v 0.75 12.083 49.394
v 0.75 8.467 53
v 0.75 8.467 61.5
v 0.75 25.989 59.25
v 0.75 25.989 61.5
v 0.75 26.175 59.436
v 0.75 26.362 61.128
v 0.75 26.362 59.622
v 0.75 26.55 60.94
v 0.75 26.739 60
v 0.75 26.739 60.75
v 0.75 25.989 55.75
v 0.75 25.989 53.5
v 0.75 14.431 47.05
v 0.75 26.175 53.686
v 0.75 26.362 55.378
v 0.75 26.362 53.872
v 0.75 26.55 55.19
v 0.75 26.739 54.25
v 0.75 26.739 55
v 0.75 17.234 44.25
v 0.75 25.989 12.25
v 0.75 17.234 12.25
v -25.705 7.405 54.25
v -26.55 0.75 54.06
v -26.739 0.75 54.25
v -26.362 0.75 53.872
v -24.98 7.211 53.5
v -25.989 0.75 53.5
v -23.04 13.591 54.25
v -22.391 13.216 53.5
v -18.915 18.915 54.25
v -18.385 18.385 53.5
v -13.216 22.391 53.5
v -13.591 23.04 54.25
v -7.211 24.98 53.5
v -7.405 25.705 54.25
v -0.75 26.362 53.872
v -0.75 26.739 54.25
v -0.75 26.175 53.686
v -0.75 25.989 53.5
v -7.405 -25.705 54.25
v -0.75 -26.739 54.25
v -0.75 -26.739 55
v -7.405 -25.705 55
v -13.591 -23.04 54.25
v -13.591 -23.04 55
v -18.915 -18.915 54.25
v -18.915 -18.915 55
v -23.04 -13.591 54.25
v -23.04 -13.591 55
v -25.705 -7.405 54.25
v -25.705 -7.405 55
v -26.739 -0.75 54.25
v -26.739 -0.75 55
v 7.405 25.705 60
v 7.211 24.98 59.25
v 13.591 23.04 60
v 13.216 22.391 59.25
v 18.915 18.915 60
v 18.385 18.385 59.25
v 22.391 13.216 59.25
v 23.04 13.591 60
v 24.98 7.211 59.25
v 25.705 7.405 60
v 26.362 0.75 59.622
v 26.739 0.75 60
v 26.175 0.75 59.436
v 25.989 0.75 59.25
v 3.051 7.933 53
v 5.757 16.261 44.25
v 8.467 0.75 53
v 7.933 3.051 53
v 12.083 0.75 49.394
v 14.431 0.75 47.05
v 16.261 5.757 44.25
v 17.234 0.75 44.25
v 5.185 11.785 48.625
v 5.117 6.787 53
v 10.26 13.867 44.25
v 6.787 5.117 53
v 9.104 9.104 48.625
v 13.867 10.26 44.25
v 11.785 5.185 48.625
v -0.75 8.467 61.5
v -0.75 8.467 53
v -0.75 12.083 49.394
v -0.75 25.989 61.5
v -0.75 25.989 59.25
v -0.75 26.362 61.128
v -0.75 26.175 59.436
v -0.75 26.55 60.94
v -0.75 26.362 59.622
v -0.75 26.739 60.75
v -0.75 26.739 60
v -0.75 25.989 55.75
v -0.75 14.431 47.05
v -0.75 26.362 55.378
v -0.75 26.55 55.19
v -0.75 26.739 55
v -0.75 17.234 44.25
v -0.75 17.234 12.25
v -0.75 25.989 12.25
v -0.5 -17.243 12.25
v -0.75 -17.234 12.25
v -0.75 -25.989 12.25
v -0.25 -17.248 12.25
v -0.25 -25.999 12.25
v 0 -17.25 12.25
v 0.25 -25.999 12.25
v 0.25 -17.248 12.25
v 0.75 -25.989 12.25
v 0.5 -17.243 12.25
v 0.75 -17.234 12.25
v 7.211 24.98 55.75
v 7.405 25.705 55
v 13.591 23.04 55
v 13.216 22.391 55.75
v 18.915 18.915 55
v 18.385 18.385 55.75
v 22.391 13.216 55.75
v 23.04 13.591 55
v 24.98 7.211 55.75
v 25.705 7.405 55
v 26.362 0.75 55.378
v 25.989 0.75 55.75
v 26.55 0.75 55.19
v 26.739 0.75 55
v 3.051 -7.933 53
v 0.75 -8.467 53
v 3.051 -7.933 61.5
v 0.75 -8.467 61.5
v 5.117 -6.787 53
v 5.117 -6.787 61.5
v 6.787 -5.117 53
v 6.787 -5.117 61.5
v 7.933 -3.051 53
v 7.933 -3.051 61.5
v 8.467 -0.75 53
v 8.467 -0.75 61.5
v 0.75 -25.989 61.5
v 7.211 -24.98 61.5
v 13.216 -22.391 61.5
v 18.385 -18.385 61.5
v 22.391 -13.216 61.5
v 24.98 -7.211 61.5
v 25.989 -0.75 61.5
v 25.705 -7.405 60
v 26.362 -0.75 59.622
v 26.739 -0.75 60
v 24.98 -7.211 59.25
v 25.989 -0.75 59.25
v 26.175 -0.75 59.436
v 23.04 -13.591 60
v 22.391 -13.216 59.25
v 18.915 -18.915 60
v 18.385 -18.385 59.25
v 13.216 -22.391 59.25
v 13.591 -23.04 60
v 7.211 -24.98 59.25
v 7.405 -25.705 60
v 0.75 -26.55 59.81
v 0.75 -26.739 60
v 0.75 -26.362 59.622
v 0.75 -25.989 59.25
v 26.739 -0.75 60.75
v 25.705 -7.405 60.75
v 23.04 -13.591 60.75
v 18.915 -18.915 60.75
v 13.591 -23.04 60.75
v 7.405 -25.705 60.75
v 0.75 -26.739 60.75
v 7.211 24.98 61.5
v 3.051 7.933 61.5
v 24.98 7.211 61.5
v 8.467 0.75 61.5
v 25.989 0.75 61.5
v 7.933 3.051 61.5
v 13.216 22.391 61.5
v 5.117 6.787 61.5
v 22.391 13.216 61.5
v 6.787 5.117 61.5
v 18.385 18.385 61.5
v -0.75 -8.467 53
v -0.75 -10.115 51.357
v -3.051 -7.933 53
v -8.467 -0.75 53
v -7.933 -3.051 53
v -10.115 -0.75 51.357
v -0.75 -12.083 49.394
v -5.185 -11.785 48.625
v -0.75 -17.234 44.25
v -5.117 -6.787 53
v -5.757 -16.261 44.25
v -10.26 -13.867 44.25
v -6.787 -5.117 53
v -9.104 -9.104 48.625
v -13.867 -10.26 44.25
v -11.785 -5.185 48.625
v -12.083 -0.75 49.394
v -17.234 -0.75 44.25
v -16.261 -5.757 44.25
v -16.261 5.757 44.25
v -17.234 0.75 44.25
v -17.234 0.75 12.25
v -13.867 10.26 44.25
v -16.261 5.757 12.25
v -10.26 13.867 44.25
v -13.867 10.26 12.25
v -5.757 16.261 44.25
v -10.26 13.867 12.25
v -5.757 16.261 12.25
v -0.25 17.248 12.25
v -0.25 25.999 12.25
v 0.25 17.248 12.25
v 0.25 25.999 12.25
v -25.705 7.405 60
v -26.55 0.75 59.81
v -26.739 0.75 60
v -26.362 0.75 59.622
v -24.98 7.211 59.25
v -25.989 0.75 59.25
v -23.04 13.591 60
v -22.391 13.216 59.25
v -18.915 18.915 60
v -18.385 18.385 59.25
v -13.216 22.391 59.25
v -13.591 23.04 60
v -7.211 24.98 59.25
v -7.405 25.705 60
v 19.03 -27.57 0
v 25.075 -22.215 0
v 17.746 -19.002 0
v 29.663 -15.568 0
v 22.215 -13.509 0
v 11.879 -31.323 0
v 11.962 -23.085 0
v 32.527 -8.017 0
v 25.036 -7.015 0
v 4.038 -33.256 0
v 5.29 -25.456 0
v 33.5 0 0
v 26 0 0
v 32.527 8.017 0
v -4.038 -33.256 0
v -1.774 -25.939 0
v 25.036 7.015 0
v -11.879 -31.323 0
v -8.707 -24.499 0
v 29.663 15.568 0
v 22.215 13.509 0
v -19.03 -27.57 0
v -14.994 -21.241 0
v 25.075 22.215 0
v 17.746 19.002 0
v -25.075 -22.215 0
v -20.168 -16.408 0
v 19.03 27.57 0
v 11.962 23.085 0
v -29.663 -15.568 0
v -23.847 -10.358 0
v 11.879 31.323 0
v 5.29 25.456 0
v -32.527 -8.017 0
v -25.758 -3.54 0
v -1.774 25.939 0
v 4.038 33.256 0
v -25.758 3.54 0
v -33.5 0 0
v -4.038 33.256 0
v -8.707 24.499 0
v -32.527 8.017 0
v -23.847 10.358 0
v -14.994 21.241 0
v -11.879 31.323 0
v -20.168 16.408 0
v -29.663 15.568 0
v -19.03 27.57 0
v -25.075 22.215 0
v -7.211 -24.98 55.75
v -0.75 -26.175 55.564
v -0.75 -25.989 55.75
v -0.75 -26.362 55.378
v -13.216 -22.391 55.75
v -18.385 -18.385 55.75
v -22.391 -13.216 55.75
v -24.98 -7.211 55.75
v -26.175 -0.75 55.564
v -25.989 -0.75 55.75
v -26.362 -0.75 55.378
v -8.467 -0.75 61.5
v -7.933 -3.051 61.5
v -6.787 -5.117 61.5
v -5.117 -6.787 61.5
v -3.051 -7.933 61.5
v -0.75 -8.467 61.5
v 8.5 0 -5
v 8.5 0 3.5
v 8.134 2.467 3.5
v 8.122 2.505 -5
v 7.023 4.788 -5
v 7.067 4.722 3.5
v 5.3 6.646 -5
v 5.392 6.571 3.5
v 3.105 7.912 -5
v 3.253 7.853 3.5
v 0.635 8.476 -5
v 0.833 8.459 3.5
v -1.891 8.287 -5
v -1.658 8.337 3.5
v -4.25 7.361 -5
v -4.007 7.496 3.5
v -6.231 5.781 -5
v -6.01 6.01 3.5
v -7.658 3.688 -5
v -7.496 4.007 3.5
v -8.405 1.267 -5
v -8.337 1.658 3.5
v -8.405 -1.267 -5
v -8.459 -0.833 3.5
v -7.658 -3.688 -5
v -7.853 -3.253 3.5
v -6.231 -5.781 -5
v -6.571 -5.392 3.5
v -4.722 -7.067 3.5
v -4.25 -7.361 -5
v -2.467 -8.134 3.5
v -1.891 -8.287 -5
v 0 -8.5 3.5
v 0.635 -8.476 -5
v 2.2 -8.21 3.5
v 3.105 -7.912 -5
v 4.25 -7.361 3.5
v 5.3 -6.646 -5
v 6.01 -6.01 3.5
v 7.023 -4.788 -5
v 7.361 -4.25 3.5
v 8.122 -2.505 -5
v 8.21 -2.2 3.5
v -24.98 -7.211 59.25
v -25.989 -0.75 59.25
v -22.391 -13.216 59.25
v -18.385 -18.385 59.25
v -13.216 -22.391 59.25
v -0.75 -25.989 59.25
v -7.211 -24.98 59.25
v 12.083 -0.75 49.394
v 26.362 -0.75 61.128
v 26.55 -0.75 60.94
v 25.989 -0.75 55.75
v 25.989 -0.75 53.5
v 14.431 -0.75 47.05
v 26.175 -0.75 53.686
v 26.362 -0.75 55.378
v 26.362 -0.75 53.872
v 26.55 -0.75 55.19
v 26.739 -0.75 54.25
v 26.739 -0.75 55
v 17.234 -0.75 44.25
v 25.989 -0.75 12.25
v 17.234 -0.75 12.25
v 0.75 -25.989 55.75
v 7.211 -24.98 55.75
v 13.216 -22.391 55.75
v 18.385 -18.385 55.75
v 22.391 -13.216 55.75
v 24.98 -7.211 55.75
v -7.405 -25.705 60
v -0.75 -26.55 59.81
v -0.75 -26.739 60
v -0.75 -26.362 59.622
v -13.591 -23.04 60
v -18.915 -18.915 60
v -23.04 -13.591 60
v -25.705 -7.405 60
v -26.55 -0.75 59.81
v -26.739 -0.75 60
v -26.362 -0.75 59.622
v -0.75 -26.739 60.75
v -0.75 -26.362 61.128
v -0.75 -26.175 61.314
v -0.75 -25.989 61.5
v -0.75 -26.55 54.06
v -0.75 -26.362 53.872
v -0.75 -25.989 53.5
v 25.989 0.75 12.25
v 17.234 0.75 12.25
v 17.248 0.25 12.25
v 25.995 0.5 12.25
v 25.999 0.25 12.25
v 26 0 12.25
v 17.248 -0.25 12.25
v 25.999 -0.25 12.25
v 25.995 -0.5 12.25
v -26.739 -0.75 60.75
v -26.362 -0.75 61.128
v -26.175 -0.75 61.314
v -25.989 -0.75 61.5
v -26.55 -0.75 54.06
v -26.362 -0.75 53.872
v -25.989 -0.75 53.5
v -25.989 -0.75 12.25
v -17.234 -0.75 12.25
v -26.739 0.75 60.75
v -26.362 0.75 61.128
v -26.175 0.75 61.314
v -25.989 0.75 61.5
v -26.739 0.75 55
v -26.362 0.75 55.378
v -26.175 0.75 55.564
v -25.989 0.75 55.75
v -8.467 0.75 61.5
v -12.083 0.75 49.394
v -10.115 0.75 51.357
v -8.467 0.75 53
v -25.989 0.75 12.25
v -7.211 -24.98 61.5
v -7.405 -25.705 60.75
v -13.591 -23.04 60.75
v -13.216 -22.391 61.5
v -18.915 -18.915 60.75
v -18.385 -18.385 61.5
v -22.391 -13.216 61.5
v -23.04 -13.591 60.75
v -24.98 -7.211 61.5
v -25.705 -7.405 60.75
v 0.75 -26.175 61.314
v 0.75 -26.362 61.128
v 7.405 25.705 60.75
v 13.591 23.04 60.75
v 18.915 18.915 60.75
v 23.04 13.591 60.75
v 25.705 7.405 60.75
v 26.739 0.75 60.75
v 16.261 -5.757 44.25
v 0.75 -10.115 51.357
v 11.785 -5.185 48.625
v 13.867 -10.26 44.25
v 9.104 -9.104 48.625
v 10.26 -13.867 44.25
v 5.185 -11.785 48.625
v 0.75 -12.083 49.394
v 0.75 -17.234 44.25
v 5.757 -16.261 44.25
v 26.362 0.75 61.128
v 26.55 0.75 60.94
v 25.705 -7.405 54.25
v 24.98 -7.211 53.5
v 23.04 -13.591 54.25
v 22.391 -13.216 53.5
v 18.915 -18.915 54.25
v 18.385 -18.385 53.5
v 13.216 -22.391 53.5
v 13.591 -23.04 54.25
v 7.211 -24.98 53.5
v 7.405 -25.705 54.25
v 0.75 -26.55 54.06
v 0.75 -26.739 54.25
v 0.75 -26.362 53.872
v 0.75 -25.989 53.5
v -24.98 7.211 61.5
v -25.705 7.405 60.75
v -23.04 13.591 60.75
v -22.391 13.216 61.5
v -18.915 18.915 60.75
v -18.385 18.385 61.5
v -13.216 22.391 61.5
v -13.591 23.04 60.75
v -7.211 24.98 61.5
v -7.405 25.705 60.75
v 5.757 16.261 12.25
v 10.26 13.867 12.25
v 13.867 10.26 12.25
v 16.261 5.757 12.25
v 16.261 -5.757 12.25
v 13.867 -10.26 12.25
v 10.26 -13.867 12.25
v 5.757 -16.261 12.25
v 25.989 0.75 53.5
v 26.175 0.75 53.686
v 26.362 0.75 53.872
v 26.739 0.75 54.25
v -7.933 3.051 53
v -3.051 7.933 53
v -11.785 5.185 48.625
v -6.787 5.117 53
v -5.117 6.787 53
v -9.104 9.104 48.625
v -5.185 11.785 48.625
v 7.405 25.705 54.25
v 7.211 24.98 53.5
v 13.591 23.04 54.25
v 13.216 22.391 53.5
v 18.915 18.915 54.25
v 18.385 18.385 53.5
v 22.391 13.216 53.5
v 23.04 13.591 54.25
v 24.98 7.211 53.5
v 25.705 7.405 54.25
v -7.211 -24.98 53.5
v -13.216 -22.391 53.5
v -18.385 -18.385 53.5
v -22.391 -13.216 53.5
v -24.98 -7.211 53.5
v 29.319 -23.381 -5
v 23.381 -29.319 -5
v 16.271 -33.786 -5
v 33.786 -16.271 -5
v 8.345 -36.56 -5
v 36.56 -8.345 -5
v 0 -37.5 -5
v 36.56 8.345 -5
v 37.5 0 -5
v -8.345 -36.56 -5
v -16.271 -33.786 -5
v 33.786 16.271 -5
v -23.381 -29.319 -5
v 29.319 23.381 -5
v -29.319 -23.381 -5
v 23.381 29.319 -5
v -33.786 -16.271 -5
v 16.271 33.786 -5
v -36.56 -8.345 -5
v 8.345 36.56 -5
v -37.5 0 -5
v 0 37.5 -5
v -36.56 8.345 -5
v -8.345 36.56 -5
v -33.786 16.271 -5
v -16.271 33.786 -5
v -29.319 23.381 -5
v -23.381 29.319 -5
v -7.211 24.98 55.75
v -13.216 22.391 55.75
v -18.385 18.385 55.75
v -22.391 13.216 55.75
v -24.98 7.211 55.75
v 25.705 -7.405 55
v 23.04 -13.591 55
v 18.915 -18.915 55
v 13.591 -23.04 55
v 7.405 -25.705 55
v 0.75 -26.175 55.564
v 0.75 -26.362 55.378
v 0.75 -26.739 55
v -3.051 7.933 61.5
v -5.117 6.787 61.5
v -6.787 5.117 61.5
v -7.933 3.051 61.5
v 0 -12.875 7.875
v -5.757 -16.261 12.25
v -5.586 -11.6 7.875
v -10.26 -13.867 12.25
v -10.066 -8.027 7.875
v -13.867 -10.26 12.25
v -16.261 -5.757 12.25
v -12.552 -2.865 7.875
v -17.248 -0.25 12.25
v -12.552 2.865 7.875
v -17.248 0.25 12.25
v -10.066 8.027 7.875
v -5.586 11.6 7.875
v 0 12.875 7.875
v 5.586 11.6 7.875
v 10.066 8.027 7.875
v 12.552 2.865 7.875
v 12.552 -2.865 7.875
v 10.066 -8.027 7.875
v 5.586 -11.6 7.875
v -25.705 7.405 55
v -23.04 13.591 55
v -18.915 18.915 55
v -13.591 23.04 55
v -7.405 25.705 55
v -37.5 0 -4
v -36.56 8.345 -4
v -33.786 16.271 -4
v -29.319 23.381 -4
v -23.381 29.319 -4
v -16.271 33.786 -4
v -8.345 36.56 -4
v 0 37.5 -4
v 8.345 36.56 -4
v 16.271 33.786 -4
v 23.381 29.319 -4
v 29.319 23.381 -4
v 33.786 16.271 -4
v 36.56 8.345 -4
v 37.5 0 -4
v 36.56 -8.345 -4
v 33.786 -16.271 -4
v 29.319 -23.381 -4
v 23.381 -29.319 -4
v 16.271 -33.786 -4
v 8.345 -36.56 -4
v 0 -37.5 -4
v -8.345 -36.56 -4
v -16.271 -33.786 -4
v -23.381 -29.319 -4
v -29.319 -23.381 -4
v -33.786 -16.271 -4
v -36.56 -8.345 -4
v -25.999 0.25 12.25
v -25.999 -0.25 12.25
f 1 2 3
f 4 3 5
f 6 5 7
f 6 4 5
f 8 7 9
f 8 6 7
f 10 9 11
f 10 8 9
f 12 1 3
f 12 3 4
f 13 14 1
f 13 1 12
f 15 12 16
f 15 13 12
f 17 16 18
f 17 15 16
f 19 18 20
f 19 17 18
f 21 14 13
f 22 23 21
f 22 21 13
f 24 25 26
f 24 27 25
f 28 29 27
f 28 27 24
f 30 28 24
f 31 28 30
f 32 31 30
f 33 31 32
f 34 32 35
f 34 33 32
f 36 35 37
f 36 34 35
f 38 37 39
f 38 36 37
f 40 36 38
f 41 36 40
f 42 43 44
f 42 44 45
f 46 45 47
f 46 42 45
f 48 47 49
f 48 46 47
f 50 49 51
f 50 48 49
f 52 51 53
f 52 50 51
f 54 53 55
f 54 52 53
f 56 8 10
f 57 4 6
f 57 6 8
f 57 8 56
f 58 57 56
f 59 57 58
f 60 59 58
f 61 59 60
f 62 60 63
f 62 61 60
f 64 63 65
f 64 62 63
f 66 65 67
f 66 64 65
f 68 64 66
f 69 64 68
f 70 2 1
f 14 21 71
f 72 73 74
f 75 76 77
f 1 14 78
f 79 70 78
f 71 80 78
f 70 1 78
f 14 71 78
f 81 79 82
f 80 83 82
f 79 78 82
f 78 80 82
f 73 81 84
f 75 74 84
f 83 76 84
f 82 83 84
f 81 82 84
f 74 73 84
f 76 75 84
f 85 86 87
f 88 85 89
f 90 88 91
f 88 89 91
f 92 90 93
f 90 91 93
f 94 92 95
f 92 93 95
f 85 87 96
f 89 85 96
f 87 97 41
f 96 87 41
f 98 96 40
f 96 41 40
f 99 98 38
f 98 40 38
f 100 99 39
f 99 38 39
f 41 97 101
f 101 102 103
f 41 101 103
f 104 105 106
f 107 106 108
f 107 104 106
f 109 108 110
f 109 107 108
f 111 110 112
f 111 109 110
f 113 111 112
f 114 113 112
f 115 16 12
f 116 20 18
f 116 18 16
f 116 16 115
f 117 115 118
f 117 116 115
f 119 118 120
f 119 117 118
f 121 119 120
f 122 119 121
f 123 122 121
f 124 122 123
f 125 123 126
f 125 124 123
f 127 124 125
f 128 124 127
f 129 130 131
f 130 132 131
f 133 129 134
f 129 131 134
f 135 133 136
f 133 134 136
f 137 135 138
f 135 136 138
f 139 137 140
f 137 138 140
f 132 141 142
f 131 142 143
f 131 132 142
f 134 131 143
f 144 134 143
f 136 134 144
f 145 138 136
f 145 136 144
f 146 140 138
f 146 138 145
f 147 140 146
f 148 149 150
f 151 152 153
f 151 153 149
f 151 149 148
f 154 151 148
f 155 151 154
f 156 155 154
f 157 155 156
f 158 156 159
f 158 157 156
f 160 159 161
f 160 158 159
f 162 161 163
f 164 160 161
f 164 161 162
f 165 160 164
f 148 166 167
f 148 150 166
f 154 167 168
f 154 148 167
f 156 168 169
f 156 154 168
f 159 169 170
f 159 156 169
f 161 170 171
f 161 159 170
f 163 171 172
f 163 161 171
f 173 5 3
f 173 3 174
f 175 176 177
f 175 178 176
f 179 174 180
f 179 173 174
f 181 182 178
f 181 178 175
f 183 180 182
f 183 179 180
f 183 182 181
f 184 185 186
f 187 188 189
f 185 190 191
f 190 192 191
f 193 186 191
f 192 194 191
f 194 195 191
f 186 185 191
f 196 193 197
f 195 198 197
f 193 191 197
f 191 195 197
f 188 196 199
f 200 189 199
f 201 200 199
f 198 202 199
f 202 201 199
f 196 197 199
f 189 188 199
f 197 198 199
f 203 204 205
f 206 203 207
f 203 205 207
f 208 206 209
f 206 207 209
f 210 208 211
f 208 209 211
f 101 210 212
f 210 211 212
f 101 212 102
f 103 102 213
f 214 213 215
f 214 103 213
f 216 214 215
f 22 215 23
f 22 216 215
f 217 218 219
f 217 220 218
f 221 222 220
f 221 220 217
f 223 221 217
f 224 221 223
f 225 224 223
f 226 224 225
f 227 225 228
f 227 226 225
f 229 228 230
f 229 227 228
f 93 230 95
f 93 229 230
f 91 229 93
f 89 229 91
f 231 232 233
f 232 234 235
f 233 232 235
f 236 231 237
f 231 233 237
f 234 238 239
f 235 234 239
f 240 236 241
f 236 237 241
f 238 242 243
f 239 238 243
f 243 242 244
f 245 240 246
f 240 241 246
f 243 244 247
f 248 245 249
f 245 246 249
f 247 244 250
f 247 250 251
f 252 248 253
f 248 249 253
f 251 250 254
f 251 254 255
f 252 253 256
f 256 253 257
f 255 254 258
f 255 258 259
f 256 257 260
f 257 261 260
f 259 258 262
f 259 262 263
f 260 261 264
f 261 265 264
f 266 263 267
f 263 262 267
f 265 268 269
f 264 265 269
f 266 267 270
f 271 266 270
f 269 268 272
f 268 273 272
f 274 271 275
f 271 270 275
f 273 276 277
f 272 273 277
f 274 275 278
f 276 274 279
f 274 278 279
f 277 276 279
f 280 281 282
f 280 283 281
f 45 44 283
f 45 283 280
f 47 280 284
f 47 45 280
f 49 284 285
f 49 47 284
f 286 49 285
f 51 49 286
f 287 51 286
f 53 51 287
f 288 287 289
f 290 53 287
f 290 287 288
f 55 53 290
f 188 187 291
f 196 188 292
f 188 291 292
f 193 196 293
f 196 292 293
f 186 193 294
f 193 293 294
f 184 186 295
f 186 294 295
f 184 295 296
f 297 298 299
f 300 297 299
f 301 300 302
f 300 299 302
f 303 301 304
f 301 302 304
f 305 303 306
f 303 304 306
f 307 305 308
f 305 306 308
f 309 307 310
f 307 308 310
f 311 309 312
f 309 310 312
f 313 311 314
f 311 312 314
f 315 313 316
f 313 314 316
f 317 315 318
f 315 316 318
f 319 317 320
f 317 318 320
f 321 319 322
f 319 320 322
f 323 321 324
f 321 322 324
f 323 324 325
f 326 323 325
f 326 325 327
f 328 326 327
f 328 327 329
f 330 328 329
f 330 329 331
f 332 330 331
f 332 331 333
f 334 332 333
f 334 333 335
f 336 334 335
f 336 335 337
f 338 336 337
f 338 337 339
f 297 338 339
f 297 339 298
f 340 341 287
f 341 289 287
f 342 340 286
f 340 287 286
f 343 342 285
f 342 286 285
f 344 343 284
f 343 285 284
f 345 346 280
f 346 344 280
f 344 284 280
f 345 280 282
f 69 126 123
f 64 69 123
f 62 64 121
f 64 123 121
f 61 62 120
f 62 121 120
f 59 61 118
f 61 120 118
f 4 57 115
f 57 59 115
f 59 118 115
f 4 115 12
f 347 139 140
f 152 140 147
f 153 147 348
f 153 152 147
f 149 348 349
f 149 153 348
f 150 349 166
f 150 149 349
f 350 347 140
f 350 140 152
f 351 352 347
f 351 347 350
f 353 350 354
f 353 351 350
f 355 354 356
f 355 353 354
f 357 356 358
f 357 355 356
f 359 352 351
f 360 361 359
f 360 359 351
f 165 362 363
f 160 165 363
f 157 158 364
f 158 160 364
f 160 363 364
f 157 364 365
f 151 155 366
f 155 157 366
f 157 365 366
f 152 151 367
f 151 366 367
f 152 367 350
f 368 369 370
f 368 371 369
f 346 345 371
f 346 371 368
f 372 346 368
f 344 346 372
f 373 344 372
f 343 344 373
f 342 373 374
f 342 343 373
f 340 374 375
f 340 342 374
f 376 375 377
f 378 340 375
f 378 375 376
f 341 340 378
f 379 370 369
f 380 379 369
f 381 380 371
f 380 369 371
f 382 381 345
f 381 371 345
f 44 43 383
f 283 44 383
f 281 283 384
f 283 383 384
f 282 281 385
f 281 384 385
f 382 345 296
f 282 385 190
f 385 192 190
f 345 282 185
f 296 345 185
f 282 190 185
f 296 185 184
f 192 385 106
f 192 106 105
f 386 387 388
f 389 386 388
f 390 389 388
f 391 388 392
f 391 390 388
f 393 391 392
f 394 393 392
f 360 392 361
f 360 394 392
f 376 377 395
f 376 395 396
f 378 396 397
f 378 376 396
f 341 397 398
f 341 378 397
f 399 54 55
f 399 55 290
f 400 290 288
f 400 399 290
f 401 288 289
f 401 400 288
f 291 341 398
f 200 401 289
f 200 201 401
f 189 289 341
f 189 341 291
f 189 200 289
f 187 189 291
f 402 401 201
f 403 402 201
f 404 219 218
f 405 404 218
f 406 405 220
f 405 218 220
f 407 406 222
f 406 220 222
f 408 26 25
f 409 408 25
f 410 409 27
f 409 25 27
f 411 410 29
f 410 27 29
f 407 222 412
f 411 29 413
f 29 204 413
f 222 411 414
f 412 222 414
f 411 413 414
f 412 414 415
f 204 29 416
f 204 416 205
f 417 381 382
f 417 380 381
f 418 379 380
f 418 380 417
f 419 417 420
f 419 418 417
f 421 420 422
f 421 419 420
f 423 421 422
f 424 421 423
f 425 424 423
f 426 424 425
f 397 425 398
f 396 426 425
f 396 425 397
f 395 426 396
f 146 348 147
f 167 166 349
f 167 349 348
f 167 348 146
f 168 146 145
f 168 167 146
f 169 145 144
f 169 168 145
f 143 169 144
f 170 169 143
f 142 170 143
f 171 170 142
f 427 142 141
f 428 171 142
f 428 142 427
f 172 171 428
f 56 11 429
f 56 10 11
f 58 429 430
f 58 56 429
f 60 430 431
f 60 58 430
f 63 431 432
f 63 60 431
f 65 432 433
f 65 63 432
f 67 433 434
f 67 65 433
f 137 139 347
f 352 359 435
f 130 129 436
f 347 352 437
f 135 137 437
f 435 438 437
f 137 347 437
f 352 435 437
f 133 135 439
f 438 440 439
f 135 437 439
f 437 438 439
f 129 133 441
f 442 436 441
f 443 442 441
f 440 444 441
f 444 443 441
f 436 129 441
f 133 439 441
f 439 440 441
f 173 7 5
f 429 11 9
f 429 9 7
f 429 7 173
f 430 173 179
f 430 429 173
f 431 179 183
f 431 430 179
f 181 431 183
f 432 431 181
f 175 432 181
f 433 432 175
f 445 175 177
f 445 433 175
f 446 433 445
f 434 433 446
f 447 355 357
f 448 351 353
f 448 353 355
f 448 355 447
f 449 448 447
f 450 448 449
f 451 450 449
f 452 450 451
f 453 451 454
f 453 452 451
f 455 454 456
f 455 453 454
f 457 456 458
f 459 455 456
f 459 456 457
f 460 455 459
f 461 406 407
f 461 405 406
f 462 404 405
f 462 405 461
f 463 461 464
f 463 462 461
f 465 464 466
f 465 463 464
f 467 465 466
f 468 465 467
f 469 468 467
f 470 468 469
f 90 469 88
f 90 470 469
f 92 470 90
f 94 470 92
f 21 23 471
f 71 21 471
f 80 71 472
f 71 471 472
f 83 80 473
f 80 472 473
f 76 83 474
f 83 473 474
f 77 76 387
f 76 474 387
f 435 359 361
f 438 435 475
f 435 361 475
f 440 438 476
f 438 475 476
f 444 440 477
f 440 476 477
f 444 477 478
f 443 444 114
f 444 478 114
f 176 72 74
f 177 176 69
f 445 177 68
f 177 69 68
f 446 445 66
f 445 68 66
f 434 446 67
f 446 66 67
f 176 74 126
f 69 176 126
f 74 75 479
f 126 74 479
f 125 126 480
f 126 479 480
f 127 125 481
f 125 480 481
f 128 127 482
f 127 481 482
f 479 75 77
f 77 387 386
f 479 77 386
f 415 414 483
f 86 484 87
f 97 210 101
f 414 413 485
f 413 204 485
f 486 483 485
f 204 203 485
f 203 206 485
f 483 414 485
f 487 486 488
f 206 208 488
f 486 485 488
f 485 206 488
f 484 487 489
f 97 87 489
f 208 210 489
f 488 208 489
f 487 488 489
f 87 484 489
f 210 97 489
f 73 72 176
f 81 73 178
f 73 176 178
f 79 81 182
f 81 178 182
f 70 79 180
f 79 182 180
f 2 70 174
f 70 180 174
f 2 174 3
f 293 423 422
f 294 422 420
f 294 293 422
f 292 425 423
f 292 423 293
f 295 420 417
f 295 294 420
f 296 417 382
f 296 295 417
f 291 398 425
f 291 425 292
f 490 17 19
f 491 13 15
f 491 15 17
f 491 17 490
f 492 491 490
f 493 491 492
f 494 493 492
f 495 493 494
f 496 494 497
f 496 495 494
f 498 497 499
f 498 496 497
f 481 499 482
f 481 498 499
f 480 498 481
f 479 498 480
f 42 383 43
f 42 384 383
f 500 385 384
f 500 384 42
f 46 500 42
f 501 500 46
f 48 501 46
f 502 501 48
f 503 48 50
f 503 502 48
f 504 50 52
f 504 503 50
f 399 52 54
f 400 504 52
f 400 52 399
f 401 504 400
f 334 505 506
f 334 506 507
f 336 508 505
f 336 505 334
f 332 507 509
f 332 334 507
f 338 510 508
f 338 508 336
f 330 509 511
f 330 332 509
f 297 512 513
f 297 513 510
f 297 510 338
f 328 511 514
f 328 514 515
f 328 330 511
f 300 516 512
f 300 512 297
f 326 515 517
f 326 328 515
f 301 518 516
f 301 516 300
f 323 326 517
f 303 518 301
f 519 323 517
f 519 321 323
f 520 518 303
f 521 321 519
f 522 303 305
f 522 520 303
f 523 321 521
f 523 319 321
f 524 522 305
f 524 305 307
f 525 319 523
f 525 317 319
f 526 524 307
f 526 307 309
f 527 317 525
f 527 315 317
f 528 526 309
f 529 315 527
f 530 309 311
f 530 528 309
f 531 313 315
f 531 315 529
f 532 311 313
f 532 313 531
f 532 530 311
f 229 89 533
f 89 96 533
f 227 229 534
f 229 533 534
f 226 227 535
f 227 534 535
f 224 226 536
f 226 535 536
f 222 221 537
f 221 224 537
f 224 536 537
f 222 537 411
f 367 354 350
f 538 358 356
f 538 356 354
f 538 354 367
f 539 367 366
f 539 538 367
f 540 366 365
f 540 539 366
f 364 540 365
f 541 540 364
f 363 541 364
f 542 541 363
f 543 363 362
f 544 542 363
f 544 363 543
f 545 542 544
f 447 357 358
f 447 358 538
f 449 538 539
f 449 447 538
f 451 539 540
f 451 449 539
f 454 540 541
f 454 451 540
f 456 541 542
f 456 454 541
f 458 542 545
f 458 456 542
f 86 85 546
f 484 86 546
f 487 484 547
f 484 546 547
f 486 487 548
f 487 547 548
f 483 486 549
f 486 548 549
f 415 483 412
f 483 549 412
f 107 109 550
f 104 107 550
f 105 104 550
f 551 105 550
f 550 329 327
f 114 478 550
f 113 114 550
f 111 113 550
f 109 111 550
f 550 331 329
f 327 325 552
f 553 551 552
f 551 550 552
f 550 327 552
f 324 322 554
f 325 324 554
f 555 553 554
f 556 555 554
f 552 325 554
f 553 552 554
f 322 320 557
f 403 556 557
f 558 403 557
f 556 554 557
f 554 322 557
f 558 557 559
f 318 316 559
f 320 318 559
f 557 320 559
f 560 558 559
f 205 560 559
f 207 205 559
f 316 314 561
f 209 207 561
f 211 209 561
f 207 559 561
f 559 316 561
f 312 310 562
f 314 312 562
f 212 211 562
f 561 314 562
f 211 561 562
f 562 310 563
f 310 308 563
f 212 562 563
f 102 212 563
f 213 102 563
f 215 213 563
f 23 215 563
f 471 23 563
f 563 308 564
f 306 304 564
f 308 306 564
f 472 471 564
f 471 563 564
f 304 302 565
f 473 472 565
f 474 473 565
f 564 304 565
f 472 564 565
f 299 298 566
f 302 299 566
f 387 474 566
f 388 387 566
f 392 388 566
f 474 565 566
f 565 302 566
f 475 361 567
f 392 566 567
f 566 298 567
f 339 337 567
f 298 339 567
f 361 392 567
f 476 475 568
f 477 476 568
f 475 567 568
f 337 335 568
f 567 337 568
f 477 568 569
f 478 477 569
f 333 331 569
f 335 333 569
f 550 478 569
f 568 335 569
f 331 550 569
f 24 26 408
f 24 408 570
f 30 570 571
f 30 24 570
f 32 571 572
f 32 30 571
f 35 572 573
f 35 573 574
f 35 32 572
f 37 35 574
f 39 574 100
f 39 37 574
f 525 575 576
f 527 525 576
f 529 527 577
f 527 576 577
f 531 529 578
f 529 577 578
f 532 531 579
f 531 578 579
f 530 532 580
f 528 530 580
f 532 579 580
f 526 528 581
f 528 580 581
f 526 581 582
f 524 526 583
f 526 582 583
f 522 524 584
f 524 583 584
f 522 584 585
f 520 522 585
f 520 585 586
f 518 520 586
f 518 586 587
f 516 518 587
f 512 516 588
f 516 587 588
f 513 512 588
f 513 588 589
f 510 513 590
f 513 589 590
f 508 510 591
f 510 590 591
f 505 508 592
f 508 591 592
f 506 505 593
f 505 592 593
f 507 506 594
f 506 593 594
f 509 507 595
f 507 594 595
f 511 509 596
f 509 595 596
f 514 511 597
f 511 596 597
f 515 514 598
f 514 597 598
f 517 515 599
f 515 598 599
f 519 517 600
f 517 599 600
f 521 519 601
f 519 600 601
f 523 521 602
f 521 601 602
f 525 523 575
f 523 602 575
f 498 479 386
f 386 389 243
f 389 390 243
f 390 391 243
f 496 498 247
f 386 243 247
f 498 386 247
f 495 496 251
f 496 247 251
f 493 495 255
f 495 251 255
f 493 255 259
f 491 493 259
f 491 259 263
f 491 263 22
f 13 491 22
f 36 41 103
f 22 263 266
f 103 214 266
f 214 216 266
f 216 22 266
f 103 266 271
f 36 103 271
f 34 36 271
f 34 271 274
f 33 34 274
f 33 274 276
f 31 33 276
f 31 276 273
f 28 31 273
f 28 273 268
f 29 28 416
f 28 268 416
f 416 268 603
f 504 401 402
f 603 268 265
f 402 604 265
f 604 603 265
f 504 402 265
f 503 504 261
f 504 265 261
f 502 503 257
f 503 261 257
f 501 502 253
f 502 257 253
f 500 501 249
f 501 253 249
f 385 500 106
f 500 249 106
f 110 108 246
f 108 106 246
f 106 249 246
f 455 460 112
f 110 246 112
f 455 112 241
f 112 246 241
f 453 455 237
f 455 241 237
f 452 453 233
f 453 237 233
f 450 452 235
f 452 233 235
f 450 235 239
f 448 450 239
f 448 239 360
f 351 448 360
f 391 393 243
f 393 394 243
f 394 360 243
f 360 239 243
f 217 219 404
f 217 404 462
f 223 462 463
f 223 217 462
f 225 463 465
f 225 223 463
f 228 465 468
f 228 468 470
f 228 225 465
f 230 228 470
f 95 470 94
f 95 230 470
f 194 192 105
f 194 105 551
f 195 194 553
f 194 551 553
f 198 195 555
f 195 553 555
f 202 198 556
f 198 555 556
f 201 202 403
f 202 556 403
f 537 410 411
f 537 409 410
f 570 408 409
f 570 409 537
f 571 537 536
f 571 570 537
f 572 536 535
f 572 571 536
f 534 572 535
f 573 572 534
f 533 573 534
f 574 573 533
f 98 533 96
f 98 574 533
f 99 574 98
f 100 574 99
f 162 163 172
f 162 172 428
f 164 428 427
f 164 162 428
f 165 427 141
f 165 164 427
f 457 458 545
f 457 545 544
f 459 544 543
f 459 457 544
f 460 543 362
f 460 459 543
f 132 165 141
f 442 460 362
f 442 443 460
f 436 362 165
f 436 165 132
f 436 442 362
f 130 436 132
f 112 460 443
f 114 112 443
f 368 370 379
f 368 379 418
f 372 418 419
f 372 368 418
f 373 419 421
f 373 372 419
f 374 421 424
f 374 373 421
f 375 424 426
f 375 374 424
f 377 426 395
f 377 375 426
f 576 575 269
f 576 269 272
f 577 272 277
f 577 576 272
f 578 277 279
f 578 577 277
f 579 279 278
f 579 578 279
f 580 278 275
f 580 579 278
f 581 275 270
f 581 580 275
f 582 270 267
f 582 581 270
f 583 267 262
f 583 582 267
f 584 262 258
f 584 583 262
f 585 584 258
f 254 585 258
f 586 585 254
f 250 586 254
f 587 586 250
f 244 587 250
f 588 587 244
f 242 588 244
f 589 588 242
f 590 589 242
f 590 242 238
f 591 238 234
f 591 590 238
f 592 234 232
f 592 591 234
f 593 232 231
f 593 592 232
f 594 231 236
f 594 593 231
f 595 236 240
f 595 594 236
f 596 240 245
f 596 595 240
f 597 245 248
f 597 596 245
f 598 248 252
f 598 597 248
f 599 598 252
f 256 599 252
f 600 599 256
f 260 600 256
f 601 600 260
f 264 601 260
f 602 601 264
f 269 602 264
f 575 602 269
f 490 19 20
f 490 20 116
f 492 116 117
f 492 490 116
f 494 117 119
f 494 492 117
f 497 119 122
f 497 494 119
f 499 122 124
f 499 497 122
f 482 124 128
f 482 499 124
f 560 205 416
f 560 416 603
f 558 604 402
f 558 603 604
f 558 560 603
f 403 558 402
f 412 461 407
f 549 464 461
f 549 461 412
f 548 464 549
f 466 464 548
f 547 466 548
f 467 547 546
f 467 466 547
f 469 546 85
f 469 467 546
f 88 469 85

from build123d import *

# Parameters (mm, degrees)
AXLE_BASE_SKETCH_R        = 26
AXLE_DEPTH                = 61.5
GUARD_BASE_R              = 37.5
GUARD_DEPTH               = 5
INNER_AXLE_HOLE_BASE_R    = 8.5
INNER_AXLE_HOLE_DEPTH     = 67.5
BEND_START                = -49.25
BEND_ROOM_BASE_W          = 1.5
BEND_ROOM_BASE_H          = 75
BEND_ROOM_1_DEPTH         = 49.25
BEND_ROOM_2_COUNT         = 2
BEND_ROOM_2_ANGLE         = 90
EASY_REMOVAL_CHAMFER_SIZE = 4


with BuildPart() as part:
    # Axle base sketch → Axle (new body)
    with BuildSketch(Plane.XY):
        Circle(AXLE_BASE_SKETCH_R)
    extrude(amount=AXLE_DEPTH)

    # Guard base → Guard (add)
    with BuildSketch(Plane(origin=(0, 0, 0), x_dir=(-1, 0, 0), z_dir=(0, 0, -1))):
        Circle(GUARD_BASE_R)
    extrude(amount=GUARD_DEPTH)

    # Inner axle hole base → Inner axle hole (cut, through all)
    with BuildSketch(Plane.XY.offset(61.5)):
        Circle(INNER_AXLE_HOLE_BASE_R)
    extrude(amount=-INNER_AXLE_HOLE_DEPTH, mode=Mode.SUBTRACT)

    # Mate ring base → Mate rings (revolve)
    with BuildSketch(Plane(origin=(0, 0, 0), x_dir=(1, 0, 0), z_dir=(0, 1, 0))):
        Polygon((26, -61.5), (26.75, -60.75), (26.75, -60), (26, -59.25), align=None)
        Polygon((26, -55.75), (26.75, -55), (26.75, -54.25), (26, -53.5), align=None)
    revolve(axis=Axis((0, 0, 0), (0, 0, -1)))

    # Inner mass remove base → Inner mass remove (revolve, cut)
    with BuildSketch(Plane(origin=(0, 0, 0), x_dir=(0, 0, -1), z_dir=(1, 0, 0))):
        Polygon((-61.5, 0), (-44.25, -17.25), (-12.25, -17.25), (5, 0), align=None)
    revolve(axis=Axis((0, 0, 0), (0, 0, -1)), mode=Mode.SUBTRACT)

    # Bend room base → Bend room 1 (cut)
    with BuildSketch(Plane.XY.offset(61.5).offset(BEND_START)):
        Rectangle(BEND_ROOM_BASE_W, BEND_ROOM_BASE_H)
    bend_room_1 = extrude(amount=BEND_ROOM_1_DEPTH, mode=Mode.SUBTRACT)

    # Bend room 2: Bend room 1 ×2 about axis
    bend_room_2_axis = Axis((0, 0, 0), (0, 0, -1))
    for i in range(1, BEND_ROOM_2_COUNT):
        add(bend_room_1.rotate(bend_room_2_axis, i * BEND_ROOM_2_ANGLE / (BEND_ROOM_2_COUNT - 1)), mode=Mode.SUBTRACT)

    # Easy removal chamfer
    easy_removal_chamfer_edges = [part.edges().sort_by_distance(p)[0] for p in [
        (37.5, 0, 0),
    ]]
    chamfer(easy_removal_chamfer_edges, length=EASY_REMOVAL_CHAMFER_SIZE)


solid = part.part
